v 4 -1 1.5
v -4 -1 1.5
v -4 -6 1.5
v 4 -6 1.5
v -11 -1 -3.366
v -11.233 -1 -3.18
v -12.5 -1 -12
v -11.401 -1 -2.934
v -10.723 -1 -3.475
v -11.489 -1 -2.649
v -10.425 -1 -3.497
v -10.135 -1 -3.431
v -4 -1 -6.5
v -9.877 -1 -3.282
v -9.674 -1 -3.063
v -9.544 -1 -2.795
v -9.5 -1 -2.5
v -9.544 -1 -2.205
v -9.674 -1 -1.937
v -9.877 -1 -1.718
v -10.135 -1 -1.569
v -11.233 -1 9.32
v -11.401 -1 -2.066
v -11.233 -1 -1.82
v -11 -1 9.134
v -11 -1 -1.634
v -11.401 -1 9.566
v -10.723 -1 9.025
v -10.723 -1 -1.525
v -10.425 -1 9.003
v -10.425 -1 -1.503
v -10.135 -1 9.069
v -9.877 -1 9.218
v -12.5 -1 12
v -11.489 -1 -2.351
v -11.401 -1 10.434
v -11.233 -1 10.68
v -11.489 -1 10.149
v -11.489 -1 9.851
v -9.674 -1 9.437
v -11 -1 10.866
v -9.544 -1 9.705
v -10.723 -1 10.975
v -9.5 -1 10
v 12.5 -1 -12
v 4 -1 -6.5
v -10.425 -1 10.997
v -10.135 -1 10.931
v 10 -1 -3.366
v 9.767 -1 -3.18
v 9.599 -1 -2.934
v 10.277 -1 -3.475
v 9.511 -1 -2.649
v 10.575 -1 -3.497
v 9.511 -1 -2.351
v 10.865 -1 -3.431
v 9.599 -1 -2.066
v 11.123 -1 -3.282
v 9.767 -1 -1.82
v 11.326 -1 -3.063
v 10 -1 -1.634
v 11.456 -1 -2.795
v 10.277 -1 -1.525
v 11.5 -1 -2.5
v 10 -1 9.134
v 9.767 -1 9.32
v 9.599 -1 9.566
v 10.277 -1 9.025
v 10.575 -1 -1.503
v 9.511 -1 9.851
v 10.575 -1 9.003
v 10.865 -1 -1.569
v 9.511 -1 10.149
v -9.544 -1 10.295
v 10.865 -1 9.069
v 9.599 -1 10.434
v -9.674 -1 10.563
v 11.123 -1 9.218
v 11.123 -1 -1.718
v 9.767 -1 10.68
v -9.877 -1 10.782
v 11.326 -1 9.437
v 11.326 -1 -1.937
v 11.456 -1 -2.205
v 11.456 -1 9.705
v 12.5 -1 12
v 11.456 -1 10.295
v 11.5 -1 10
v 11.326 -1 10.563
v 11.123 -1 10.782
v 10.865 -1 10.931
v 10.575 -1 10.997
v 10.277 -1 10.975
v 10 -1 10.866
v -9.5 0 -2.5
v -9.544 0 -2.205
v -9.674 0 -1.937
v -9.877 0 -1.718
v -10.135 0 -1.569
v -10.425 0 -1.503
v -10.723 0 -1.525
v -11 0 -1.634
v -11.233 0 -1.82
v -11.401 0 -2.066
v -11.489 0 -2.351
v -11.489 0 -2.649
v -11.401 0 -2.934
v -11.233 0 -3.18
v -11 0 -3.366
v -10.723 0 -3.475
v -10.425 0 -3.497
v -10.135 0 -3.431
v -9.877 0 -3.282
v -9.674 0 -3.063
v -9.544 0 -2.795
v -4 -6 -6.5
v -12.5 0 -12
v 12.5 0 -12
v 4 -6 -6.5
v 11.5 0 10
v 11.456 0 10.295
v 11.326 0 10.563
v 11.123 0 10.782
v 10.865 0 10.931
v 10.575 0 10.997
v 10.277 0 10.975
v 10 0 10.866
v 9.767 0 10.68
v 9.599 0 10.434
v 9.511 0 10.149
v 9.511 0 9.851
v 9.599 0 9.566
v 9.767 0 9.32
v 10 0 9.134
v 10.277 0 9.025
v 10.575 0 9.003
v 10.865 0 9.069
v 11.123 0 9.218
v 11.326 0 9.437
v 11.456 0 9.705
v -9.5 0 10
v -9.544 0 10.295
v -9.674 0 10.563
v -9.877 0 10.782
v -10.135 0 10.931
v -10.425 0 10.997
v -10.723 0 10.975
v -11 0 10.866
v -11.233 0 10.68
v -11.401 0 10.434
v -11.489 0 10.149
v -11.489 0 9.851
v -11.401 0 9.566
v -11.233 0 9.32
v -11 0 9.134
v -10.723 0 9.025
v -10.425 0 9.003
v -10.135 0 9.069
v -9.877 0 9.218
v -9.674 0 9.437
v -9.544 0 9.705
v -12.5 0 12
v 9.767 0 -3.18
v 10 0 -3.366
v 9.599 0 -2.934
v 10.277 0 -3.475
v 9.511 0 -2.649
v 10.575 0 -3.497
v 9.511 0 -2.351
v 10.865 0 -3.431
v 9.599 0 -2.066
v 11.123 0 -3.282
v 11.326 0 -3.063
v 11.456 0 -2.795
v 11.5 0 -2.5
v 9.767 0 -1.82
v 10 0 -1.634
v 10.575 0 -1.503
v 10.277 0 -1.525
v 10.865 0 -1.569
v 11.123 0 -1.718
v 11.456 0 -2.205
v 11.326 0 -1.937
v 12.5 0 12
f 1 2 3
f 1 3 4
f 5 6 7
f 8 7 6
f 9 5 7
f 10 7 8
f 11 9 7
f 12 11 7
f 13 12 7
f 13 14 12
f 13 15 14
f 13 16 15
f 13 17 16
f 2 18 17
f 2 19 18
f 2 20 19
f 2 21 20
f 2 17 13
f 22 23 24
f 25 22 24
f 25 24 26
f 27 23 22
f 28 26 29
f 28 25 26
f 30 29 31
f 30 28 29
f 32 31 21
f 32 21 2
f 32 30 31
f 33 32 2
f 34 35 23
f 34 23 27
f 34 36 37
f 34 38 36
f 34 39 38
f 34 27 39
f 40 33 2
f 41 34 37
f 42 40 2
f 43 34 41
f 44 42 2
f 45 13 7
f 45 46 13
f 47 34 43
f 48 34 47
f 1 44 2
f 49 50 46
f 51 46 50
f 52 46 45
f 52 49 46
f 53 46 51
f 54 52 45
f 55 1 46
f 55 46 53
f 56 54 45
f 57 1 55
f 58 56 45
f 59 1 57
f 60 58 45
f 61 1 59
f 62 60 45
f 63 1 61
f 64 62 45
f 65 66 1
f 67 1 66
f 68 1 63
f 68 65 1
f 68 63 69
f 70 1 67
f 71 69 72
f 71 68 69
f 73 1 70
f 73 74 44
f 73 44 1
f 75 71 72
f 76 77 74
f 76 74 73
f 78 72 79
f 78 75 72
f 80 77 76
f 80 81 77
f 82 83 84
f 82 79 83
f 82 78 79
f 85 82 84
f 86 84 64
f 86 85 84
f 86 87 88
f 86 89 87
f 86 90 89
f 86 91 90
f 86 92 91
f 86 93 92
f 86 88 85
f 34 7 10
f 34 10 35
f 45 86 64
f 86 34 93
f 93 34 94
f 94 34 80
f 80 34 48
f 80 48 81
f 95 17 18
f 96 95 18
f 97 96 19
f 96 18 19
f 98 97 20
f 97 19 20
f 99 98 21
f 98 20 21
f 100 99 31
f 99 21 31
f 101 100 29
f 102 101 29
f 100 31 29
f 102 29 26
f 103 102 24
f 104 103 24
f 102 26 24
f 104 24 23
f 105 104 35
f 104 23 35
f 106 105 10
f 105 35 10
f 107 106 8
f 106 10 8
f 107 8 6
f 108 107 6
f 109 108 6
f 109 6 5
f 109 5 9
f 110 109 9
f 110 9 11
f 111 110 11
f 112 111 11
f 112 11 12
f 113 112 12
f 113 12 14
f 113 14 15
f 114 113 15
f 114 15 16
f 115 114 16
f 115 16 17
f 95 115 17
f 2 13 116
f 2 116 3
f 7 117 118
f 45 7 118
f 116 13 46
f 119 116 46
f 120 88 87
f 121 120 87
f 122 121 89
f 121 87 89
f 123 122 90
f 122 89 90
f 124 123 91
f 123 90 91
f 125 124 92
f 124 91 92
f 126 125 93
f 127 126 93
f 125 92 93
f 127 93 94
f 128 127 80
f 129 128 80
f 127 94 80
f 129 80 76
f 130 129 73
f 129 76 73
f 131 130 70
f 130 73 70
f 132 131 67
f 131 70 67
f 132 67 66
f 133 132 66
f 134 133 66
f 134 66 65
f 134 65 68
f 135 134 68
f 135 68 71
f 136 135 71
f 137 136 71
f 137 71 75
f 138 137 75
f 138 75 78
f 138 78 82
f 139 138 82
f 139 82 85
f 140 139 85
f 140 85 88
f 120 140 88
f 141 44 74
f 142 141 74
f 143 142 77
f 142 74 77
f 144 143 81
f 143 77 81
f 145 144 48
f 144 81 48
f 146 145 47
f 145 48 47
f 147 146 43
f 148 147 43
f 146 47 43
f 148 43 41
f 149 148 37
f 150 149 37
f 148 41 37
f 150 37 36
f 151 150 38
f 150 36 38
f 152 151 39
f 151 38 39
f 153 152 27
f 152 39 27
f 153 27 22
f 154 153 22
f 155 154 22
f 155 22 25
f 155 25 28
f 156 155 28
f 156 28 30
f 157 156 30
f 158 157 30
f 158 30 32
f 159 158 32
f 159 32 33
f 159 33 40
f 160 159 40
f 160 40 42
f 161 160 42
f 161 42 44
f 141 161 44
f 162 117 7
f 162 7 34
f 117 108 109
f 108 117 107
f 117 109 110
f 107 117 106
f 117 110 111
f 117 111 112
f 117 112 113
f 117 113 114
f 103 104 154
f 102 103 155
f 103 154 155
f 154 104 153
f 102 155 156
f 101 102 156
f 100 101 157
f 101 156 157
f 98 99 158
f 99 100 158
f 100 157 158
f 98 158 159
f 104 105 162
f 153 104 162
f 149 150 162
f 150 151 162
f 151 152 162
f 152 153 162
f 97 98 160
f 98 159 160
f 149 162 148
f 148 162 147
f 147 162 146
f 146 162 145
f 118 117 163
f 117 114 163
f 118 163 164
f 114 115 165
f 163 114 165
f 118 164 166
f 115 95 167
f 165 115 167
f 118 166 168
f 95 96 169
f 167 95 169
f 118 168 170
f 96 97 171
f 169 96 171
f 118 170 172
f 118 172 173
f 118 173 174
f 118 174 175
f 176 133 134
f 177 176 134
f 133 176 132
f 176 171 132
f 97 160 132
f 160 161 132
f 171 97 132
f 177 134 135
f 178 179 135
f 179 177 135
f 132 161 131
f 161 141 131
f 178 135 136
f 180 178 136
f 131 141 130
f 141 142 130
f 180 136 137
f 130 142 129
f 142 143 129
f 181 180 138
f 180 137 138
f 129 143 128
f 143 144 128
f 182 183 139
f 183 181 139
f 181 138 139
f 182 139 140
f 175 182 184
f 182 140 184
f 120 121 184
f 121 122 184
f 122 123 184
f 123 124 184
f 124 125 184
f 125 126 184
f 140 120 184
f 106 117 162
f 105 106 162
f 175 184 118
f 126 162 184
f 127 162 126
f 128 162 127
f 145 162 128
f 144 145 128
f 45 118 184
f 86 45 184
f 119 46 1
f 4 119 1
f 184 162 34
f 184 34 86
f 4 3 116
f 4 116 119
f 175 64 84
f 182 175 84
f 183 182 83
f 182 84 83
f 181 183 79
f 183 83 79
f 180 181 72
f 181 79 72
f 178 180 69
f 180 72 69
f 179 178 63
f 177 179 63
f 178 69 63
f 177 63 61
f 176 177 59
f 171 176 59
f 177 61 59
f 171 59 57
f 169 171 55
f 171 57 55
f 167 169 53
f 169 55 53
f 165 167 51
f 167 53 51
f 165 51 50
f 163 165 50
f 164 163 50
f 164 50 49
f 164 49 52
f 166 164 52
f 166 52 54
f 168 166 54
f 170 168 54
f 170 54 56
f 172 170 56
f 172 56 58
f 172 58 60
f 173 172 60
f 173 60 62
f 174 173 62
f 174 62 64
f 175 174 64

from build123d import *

# Parameters (mm, degrees)
F0_W     = 25
F0_H     = 24
F1_DEPTH = 1
F2_W     = 8
F2_H     = 8
F3_DEPTH = 5
F4_R     = 1
F5_DEPTH = 1.001


with BuildPart() as f1:
    # F0 (on Front) → F1 (new body)
    with BuildSketch(Plane.XZ):
        Rectangle(F0_W, F0_H)
    extrude(amount=F1_DEPTH)

    # F2 (on face) → F3 (join)
    with BuildSketch(Plane.XZ.offset(1)):
        with Locations((0, -2.5)):
            Rectangle(F2_W, F2_H)
    extrude(amount=F3_DEPTH)

    # F4 (on face) → F5 (cut, through all)
    with BuildSketch(Plane.XZ.offset(1)):
        with Locations((10.5, 10)):
            Circle(F4_R)
        with Locations((-10.5, 10)):
            Circle(F4_R)
        with Locations((-10.5, -2.5)):
            Circle(F4_R)
        with Locations((10.5, -2.5)):
            Circle(F4_R)
    extrude(amount=-F5_DEPTH, mode=Mode.SUBTRACT)


solid = f1.part
